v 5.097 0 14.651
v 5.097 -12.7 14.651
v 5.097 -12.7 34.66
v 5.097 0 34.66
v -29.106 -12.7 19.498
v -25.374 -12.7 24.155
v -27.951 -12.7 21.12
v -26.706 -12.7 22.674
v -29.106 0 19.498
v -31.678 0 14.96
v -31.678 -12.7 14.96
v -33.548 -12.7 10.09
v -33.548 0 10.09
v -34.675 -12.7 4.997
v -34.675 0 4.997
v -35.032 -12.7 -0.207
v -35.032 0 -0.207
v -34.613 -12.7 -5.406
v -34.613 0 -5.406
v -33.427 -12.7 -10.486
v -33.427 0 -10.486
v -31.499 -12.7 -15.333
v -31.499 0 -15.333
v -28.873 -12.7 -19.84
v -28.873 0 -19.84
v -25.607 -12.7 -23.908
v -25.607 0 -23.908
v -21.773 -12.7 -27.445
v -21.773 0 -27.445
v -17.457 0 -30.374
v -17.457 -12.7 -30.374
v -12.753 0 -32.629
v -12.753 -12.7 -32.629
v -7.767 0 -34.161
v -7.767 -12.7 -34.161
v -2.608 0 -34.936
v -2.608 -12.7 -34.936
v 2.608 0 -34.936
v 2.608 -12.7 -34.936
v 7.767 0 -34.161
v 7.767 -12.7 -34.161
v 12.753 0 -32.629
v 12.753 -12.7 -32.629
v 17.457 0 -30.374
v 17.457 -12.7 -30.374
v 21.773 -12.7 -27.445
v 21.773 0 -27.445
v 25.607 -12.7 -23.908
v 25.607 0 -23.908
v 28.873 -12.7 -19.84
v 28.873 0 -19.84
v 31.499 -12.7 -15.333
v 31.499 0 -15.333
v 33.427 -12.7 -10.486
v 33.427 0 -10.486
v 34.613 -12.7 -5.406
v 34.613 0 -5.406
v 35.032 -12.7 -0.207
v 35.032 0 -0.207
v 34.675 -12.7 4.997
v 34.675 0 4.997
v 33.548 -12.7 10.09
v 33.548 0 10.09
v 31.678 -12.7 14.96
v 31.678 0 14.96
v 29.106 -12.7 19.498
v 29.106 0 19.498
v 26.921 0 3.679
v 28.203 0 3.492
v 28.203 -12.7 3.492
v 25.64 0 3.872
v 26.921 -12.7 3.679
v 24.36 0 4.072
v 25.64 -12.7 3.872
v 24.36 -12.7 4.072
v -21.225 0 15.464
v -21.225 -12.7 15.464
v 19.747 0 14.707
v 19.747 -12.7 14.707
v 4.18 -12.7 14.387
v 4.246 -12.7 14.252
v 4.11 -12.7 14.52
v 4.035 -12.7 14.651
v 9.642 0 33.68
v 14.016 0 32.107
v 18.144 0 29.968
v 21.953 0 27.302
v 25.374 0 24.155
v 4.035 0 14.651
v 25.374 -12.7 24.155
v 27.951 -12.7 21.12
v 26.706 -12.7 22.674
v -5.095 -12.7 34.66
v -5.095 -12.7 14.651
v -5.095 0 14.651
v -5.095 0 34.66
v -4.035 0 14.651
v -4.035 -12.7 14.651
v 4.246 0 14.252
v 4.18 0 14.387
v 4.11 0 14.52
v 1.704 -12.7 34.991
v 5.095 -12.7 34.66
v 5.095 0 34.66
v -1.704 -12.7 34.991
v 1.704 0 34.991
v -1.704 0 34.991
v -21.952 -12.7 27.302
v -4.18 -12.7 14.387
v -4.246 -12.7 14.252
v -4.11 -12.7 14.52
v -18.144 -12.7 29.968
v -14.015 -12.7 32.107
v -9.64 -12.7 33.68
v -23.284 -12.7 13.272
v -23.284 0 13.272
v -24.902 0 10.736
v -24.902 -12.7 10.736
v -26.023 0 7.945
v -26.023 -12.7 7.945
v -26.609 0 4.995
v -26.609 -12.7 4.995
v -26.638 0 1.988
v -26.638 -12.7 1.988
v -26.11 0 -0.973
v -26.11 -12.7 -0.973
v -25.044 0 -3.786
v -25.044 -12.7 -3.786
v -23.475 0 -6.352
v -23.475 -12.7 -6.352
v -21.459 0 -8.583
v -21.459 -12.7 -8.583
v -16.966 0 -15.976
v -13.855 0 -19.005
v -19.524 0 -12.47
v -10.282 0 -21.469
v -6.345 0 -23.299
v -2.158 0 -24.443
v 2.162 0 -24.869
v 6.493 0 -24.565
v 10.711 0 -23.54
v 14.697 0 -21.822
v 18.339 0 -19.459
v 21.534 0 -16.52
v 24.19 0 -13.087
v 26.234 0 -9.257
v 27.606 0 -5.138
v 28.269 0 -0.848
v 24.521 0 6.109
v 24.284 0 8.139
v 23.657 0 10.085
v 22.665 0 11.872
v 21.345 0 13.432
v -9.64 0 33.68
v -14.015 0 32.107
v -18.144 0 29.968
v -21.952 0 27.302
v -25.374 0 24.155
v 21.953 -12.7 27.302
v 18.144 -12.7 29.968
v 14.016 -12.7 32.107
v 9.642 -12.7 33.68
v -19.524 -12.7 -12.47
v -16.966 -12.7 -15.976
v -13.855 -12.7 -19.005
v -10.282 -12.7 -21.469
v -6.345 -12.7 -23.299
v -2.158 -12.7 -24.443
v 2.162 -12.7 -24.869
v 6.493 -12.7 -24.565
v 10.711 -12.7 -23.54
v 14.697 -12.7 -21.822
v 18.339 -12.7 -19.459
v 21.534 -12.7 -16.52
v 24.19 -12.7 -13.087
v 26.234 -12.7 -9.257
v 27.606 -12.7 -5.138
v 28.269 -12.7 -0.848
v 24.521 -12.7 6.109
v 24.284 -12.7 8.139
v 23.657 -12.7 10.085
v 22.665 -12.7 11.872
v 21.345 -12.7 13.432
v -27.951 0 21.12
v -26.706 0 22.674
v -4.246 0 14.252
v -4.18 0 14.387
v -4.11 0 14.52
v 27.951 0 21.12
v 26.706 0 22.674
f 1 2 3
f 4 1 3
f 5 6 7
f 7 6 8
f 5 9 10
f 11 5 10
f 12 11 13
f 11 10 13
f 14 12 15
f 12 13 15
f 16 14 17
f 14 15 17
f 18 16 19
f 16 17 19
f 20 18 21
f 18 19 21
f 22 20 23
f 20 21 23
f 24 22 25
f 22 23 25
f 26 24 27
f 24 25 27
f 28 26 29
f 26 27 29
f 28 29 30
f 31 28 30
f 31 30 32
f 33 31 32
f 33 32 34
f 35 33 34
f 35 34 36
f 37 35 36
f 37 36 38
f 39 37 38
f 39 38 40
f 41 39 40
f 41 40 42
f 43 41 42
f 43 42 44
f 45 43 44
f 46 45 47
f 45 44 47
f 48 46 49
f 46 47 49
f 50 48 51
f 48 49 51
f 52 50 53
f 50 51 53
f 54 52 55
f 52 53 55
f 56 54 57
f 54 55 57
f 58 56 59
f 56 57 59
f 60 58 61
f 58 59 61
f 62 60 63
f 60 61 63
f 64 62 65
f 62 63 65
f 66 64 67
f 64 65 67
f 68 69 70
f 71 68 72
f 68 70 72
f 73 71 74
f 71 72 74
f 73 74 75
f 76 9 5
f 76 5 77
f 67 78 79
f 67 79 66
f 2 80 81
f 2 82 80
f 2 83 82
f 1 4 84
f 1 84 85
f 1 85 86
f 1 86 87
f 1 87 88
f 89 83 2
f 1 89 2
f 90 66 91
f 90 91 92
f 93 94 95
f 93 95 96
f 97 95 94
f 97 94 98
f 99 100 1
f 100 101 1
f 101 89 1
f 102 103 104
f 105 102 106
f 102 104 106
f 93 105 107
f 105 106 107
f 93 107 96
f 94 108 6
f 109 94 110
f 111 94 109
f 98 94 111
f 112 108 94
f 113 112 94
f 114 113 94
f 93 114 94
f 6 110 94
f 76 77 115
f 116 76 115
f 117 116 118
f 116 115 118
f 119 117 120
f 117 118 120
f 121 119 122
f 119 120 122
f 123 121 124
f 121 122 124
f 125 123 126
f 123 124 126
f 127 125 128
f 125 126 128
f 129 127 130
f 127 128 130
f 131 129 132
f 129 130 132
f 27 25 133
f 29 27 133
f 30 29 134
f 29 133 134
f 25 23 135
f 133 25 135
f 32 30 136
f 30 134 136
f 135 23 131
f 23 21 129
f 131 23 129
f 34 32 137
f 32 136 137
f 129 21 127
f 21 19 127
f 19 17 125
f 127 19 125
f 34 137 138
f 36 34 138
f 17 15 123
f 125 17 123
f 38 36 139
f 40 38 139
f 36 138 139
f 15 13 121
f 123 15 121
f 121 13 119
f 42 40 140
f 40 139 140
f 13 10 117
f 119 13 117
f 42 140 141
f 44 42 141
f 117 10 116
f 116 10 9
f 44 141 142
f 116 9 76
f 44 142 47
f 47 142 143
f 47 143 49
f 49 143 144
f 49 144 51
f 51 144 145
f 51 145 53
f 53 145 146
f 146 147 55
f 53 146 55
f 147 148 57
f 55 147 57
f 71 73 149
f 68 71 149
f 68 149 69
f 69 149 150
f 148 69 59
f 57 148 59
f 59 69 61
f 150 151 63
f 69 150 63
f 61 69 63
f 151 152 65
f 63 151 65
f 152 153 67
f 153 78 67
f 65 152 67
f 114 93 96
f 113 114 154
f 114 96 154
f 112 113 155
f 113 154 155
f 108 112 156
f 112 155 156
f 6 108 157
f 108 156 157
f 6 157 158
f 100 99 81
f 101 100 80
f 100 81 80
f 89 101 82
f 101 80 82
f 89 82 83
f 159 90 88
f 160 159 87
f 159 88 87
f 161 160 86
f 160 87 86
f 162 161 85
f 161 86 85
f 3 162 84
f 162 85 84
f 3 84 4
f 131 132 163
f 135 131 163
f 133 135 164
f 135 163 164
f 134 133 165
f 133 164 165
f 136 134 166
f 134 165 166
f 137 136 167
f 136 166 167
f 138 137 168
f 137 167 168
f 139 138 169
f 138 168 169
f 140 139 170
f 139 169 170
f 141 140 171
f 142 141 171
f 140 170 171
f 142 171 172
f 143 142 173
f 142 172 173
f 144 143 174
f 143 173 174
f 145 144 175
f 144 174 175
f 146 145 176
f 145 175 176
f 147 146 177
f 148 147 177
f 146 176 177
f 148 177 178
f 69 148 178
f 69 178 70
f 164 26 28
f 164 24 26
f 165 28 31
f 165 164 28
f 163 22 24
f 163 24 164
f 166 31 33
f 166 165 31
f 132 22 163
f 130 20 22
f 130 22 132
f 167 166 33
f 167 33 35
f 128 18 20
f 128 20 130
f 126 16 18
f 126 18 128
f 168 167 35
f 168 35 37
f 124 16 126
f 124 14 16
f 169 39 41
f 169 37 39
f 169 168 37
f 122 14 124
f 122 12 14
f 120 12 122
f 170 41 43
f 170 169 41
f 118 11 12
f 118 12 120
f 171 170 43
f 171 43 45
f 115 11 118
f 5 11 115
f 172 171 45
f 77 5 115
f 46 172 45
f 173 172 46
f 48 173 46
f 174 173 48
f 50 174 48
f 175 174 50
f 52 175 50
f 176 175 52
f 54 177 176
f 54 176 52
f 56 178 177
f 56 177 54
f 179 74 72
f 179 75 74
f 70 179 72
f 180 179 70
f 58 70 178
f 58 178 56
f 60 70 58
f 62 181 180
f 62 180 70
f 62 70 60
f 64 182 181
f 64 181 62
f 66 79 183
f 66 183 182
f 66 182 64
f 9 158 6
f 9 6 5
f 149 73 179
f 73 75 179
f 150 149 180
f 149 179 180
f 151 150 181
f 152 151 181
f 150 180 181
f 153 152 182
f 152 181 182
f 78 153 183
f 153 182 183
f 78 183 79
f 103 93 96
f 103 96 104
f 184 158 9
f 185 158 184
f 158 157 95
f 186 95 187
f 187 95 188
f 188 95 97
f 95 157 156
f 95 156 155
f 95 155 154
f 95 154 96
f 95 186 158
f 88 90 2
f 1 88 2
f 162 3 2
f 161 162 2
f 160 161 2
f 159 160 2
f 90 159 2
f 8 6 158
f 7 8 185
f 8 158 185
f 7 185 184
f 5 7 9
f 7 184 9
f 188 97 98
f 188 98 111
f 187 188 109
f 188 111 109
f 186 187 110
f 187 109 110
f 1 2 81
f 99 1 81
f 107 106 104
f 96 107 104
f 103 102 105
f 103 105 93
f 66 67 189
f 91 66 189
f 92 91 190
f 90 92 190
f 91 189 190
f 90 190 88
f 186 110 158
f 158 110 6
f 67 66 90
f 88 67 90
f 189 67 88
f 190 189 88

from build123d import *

# Parameters (mm, degrees)
F0_R      = 35.0328415464
F1_DEPTH  = 12.7
F3_DEPTH  = 25.4
F4_R      = 16.5906527708
F5_DEPTH  = 25.4
F7_DEPTH  = 25.4
F8_R      = 10.484641789
F9_DEPTH  = 25.4
F10_W     = 10.1928190628
F10_H     = 20.0091665545
F11_DEPTH = 25.4
F12_R     = 4.6893392764
F13_DEPTH = 25.4


with BuildPart() as f1:
    # F0 (on Front) → F1 (new body)
    with BuildSketch(Plane.XZ):
        Circle(F0_R)
    extrude(amount=F1_DEPTH)

    # F2 (on face) → F3 (cut)
    with BuildSketch(Plane.XZ.offset(12.7)):
        Polygon((0, 12.2620686889), (-25.3742998027, 24.1546040402), (-29.1055077913, 19.4979333015), (0, 4.5982757583), (29.1055077913, 19.4979333015), (25.3742998027, 24.1546040402), align=None)
    extrude(amount=-F3_DEPTH, mode=Mode.SUBTRACT)

    # F4 (on face) → F5 (cut)
    with BuildSketch(Plane.XZ.offset(12.7)):
        with Locations((0, -6.4375866205)):
            Circle(F4_R)
    extrude(amount=-F5_DEPTH, mode=Mode.SUBTRACT)

    # F6 (on face) → F7 (cut)
    with BuildSketch(Plane.XZ.offset(12.7)):
        with BuildLine():
            ThreePointArc((28.2027572393, 3.492135188), (3.2037443687, 8.3000973488), (-21.2247442943, 15.4636220596))
            ThreePointArc((-21.2247442943, 15.4636220596), (-26.6933052067, 3.492135188), (-21.4586202055, -8.5834488273))
            ThreePointArc((-21.4586202055, -8.5834488273), (8.6232728479, -24.1414686654), (28.2027572393, 3.492135188))
        make_face()
    extrude(amount=-F7_DEPTH, mode=Mode.SUBTRACT)

    # F8 (on face) → F9 (cut)
    with BuildSketch(Plane.XZ.offset(12.7)):
        with Locations((14.038223219, 5.912768994)):
            Circle(F8_R)
    extrude(amount=-F9_DEPTH, mode=Mode.SUBTRACT)

    # F10 (on face) → F11 (cut)
    with BuildSketch(Plane.XZ.offset(12.7)):
        with Locations((0.0009835802, 24.65571997)):
            Rectangle(F10_W, F10_H)
    extrude(amount=-F11_DEPTH, mode=Mode.SUBTRACT)

    # F12 (on face) → F13 (cut)
    with BuildSketch(Plane.XZ.offset(12.7)):
        with Locations((0, 12.2620686889)):
            Circle(F12_R)
    extrude(amount=-F13_DEPTH, mode=Mode.SUBTRACT)


solid = f1.part
